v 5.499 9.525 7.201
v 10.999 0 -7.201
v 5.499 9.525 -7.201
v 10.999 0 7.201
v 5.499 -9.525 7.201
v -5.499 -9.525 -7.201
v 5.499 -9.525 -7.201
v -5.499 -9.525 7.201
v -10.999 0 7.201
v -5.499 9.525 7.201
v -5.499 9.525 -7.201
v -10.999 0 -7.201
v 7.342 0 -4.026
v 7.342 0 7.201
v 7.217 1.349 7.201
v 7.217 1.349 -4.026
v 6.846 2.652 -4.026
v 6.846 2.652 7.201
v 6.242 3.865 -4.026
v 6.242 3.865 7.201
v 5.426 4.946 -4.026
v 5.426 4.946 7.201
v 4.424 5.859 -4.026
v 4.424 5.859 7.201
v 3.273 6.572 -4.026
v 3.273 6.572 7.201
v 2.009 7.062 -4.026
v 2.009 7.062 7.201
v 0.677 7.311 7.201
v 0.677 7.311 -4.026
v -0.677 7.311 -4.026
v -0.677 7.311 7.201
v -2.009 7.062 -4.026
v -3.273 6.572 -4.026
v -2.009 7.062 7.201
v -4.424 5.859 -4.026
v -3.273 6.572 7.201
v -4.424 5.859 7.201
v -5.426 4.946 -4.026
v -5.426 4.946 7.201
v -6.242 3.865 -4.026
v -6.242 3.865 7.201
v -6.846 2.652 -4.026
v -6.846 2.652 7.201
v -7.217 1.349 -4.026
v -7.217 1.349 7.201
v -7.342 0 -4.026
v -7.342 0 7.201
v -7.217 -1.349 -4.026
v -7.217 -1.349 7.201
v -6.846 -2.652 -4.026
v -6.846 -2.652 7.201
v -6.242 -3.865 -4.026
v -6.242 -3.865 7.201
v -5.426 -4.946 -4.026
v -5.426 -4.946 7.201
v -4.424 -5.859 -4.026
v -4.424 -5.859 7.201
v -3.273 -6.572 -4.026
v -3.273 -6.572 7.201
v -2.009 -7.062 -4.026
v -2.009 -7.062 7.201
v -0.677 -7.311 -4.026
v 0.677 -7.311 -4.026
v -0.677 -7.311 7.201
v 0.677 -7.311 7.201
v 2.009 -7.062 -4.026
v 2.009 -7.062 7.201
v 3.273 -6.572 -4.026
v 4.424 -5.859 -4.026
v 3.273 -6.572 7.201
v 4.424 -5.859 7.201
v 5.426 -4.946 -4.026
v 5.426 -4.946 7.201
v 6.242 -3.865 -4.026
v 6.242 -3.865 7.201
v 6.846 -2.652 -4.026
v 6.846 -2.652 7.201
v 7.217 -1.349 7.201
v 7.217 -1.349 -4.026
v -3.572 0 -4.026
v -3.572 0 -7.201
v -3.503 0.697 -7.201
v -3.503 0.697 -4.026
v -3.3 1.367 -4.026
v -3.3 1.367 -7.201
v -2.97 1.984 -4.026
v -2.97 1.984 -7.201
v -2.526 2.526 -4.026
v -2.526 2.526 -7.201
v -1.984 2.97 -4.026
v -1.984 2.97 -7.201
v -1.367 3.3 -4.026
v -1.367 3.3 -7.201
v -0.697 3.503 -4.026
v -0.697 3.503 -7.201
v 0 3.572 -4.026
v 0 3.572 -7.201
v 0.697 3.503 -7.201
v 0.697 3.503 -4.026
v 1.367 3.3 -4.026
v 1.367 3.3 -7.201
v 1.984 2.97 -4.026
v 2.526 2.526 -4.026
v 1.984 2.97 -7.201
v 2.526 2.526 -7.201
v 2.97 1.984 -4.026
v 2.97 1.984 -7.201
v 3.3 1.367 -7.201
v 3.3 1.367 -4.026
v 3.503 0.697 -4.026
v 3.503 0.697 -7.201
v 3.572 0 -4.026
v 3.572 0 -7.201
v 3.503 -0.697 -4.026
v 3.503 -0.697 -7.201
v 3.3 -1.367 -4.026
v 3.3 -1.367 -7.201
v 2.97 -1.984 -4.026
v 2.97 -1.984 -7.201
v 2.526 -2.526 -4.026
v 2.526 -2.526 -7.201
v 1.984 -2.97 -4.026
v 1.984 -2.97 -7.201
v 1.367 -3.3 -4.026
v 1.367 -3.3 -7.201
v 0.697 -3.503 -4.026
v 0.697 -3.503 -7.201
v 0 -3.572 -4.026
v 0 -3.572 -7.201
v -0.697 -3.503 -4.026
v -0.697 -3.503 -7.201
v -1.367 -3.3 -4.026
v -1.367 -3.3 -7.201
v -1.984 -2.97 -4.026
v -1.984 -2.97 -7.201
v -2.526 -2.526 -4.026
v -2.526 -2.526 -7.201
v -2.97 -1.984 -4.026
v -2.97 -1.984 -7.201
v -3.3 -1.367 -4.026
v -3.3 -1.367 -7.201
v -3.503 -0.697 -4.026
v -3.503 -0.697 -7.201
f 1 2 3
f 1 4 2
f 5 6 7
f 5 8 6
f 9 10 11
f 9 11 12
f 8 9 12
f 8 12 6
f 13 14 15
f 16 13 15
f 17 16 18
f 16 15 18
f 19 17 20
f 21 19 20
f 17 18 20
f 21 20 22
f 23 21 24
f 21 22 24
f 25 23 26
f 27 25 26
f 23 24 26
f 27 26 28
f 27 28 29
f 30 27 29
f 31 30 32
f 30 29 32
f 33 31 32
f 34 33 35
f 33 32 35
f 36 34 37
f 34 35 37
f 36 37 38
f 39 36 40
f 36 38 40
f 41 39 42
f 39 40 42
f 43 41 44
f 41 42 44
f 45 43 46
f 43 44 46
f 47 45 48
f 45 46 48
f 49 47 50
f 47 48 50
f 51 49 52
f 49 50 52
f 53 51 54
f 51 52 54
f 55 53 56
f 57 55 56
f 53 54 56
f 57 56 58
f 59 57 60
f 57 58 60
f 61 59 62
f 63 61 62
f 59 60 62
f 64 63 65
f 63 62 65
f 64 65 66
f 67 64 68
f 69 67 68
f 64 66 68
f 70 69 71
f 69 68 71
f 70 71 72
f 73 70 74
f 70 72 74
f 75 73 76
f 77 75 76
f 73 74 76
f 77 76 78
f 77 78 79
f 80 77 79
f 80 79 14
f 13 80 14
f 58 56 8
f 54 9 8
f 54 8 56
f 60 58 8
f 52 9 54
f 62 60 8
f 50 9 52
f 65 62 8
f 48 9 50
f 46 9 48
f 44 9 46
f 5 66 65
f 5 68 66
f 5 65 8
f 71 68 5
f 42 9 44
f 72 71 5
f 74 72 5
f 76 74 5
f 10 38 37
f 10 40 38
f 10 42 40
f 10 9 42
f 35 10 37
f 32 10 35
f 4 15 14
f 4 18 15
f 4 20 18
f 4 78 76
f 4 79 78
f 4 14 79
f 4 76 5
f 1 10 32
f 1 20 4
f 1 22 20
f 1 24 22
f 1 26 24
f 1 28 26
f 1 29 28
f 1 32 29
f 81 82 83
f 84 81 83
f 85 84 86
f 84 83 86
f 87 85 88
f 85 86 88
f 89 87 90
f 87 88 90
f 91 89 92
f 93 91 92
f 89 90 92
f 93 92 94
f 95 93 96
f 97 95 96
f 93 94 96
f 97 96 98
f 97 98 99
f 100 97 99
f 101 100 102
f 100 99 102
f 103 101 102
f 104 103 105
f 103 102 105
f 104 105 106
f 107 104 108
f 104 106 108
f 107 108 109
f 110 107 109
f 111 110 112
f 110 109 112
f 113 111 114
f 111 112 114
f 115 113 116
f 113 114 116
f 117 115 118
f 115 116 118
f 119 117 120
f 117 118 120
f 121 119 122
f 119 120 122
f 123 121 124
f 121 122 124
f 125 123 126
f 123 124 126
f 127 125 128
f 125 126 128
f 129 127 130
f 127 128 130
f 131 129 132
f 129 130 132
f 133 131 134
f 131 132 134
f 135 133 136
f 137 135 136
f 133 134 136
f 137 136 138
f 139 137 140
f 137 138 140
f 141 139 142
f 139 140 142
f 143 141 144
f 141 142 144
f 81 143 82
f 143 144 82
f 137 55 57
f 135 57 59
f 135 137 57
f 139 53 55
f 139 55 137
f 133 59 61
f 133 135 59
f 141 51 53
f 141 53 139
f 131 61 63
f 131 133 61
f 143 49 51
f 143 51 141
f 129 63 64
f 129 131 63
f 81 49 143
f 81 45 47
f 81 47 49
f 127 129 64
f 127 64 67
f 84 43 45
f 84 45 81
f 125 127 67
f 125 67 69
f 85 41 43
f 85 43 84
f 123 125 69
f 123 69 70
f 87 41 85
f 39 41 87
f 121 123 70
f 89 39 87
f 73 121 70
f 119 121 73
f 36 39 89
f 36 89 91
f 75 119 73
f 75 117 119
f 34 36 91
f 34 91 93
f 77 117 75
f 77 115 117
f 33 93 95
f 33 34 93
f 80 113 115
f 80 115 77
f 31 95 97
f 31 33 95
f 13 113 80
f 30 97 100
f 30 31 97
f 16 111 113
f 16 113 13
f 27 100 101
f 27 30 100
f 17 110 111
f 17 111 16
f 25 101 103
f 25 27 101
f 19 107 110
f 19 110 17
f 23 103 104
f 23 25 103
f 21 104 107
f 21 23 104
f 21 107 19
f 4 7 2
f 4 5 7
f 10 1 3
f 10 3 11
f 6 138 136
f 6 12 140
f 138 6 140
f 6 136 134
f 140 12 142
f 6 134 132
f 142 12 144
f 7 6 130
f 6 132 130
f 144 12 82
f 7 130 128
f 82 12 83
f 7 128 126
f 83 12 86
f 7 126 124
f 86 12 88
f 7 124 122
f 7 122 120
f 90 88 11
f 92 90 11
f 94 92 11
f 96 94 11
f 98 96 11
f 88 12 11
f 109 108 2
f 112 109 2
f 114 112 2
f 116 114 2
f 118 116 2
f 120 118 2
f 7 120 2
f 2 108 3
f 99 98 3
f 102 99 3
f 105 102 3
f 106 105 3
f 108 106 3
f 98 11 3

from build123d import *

# Parameters (mm, degrees)
BOSS_EXTRUDE1_DEPTH = 7.2009
SKETCH12_R          = 3.571875
CUT_EXTRUDE2_DEPTH  = 3.175
SKETCH11_R          = 7.34187
CUT_EXTRUDE3_DEPTH  = 11.2268


with BuildPart() as part:
    # Sketch1 → Boss-Extrude1 (new, symmetric)
    with BuildSketch(Plane.XY):
        Polygon((10.998522628, 0), (5.499261314, 9.525), (-5.499261314, 9.525), (-10.998522628, 0), (-5.499261314, -9.525), (5.499261314, -9.525), align=None)
    extrude(amount=BOSS_EXTRUDE1_DEPTH, both=True)

    # Sketch12 → Cut-Extrude2 (cut)
    with BuildSketch(Plane(origin=(0, 0, -7.2009), x_dir=(-1, 0, 0), z_dir=(0, 0, -1))):
        Circle(SKETCH12_R)
    extrude(amount=-CUT_EXTRUDE2_DEPTH, mode=Mode.SUBTRACT)

    # Sketch11 → Cut-Extrude3 (cut)
    with BuildSketch(Plane.XY.offset(7.2009)):
        Circle(SKETCH11_R)
    extrude(amount=-CUT_EXTRUDE3_DEPTH, mode=Mode.SUBTRACT)


solid = part.part
